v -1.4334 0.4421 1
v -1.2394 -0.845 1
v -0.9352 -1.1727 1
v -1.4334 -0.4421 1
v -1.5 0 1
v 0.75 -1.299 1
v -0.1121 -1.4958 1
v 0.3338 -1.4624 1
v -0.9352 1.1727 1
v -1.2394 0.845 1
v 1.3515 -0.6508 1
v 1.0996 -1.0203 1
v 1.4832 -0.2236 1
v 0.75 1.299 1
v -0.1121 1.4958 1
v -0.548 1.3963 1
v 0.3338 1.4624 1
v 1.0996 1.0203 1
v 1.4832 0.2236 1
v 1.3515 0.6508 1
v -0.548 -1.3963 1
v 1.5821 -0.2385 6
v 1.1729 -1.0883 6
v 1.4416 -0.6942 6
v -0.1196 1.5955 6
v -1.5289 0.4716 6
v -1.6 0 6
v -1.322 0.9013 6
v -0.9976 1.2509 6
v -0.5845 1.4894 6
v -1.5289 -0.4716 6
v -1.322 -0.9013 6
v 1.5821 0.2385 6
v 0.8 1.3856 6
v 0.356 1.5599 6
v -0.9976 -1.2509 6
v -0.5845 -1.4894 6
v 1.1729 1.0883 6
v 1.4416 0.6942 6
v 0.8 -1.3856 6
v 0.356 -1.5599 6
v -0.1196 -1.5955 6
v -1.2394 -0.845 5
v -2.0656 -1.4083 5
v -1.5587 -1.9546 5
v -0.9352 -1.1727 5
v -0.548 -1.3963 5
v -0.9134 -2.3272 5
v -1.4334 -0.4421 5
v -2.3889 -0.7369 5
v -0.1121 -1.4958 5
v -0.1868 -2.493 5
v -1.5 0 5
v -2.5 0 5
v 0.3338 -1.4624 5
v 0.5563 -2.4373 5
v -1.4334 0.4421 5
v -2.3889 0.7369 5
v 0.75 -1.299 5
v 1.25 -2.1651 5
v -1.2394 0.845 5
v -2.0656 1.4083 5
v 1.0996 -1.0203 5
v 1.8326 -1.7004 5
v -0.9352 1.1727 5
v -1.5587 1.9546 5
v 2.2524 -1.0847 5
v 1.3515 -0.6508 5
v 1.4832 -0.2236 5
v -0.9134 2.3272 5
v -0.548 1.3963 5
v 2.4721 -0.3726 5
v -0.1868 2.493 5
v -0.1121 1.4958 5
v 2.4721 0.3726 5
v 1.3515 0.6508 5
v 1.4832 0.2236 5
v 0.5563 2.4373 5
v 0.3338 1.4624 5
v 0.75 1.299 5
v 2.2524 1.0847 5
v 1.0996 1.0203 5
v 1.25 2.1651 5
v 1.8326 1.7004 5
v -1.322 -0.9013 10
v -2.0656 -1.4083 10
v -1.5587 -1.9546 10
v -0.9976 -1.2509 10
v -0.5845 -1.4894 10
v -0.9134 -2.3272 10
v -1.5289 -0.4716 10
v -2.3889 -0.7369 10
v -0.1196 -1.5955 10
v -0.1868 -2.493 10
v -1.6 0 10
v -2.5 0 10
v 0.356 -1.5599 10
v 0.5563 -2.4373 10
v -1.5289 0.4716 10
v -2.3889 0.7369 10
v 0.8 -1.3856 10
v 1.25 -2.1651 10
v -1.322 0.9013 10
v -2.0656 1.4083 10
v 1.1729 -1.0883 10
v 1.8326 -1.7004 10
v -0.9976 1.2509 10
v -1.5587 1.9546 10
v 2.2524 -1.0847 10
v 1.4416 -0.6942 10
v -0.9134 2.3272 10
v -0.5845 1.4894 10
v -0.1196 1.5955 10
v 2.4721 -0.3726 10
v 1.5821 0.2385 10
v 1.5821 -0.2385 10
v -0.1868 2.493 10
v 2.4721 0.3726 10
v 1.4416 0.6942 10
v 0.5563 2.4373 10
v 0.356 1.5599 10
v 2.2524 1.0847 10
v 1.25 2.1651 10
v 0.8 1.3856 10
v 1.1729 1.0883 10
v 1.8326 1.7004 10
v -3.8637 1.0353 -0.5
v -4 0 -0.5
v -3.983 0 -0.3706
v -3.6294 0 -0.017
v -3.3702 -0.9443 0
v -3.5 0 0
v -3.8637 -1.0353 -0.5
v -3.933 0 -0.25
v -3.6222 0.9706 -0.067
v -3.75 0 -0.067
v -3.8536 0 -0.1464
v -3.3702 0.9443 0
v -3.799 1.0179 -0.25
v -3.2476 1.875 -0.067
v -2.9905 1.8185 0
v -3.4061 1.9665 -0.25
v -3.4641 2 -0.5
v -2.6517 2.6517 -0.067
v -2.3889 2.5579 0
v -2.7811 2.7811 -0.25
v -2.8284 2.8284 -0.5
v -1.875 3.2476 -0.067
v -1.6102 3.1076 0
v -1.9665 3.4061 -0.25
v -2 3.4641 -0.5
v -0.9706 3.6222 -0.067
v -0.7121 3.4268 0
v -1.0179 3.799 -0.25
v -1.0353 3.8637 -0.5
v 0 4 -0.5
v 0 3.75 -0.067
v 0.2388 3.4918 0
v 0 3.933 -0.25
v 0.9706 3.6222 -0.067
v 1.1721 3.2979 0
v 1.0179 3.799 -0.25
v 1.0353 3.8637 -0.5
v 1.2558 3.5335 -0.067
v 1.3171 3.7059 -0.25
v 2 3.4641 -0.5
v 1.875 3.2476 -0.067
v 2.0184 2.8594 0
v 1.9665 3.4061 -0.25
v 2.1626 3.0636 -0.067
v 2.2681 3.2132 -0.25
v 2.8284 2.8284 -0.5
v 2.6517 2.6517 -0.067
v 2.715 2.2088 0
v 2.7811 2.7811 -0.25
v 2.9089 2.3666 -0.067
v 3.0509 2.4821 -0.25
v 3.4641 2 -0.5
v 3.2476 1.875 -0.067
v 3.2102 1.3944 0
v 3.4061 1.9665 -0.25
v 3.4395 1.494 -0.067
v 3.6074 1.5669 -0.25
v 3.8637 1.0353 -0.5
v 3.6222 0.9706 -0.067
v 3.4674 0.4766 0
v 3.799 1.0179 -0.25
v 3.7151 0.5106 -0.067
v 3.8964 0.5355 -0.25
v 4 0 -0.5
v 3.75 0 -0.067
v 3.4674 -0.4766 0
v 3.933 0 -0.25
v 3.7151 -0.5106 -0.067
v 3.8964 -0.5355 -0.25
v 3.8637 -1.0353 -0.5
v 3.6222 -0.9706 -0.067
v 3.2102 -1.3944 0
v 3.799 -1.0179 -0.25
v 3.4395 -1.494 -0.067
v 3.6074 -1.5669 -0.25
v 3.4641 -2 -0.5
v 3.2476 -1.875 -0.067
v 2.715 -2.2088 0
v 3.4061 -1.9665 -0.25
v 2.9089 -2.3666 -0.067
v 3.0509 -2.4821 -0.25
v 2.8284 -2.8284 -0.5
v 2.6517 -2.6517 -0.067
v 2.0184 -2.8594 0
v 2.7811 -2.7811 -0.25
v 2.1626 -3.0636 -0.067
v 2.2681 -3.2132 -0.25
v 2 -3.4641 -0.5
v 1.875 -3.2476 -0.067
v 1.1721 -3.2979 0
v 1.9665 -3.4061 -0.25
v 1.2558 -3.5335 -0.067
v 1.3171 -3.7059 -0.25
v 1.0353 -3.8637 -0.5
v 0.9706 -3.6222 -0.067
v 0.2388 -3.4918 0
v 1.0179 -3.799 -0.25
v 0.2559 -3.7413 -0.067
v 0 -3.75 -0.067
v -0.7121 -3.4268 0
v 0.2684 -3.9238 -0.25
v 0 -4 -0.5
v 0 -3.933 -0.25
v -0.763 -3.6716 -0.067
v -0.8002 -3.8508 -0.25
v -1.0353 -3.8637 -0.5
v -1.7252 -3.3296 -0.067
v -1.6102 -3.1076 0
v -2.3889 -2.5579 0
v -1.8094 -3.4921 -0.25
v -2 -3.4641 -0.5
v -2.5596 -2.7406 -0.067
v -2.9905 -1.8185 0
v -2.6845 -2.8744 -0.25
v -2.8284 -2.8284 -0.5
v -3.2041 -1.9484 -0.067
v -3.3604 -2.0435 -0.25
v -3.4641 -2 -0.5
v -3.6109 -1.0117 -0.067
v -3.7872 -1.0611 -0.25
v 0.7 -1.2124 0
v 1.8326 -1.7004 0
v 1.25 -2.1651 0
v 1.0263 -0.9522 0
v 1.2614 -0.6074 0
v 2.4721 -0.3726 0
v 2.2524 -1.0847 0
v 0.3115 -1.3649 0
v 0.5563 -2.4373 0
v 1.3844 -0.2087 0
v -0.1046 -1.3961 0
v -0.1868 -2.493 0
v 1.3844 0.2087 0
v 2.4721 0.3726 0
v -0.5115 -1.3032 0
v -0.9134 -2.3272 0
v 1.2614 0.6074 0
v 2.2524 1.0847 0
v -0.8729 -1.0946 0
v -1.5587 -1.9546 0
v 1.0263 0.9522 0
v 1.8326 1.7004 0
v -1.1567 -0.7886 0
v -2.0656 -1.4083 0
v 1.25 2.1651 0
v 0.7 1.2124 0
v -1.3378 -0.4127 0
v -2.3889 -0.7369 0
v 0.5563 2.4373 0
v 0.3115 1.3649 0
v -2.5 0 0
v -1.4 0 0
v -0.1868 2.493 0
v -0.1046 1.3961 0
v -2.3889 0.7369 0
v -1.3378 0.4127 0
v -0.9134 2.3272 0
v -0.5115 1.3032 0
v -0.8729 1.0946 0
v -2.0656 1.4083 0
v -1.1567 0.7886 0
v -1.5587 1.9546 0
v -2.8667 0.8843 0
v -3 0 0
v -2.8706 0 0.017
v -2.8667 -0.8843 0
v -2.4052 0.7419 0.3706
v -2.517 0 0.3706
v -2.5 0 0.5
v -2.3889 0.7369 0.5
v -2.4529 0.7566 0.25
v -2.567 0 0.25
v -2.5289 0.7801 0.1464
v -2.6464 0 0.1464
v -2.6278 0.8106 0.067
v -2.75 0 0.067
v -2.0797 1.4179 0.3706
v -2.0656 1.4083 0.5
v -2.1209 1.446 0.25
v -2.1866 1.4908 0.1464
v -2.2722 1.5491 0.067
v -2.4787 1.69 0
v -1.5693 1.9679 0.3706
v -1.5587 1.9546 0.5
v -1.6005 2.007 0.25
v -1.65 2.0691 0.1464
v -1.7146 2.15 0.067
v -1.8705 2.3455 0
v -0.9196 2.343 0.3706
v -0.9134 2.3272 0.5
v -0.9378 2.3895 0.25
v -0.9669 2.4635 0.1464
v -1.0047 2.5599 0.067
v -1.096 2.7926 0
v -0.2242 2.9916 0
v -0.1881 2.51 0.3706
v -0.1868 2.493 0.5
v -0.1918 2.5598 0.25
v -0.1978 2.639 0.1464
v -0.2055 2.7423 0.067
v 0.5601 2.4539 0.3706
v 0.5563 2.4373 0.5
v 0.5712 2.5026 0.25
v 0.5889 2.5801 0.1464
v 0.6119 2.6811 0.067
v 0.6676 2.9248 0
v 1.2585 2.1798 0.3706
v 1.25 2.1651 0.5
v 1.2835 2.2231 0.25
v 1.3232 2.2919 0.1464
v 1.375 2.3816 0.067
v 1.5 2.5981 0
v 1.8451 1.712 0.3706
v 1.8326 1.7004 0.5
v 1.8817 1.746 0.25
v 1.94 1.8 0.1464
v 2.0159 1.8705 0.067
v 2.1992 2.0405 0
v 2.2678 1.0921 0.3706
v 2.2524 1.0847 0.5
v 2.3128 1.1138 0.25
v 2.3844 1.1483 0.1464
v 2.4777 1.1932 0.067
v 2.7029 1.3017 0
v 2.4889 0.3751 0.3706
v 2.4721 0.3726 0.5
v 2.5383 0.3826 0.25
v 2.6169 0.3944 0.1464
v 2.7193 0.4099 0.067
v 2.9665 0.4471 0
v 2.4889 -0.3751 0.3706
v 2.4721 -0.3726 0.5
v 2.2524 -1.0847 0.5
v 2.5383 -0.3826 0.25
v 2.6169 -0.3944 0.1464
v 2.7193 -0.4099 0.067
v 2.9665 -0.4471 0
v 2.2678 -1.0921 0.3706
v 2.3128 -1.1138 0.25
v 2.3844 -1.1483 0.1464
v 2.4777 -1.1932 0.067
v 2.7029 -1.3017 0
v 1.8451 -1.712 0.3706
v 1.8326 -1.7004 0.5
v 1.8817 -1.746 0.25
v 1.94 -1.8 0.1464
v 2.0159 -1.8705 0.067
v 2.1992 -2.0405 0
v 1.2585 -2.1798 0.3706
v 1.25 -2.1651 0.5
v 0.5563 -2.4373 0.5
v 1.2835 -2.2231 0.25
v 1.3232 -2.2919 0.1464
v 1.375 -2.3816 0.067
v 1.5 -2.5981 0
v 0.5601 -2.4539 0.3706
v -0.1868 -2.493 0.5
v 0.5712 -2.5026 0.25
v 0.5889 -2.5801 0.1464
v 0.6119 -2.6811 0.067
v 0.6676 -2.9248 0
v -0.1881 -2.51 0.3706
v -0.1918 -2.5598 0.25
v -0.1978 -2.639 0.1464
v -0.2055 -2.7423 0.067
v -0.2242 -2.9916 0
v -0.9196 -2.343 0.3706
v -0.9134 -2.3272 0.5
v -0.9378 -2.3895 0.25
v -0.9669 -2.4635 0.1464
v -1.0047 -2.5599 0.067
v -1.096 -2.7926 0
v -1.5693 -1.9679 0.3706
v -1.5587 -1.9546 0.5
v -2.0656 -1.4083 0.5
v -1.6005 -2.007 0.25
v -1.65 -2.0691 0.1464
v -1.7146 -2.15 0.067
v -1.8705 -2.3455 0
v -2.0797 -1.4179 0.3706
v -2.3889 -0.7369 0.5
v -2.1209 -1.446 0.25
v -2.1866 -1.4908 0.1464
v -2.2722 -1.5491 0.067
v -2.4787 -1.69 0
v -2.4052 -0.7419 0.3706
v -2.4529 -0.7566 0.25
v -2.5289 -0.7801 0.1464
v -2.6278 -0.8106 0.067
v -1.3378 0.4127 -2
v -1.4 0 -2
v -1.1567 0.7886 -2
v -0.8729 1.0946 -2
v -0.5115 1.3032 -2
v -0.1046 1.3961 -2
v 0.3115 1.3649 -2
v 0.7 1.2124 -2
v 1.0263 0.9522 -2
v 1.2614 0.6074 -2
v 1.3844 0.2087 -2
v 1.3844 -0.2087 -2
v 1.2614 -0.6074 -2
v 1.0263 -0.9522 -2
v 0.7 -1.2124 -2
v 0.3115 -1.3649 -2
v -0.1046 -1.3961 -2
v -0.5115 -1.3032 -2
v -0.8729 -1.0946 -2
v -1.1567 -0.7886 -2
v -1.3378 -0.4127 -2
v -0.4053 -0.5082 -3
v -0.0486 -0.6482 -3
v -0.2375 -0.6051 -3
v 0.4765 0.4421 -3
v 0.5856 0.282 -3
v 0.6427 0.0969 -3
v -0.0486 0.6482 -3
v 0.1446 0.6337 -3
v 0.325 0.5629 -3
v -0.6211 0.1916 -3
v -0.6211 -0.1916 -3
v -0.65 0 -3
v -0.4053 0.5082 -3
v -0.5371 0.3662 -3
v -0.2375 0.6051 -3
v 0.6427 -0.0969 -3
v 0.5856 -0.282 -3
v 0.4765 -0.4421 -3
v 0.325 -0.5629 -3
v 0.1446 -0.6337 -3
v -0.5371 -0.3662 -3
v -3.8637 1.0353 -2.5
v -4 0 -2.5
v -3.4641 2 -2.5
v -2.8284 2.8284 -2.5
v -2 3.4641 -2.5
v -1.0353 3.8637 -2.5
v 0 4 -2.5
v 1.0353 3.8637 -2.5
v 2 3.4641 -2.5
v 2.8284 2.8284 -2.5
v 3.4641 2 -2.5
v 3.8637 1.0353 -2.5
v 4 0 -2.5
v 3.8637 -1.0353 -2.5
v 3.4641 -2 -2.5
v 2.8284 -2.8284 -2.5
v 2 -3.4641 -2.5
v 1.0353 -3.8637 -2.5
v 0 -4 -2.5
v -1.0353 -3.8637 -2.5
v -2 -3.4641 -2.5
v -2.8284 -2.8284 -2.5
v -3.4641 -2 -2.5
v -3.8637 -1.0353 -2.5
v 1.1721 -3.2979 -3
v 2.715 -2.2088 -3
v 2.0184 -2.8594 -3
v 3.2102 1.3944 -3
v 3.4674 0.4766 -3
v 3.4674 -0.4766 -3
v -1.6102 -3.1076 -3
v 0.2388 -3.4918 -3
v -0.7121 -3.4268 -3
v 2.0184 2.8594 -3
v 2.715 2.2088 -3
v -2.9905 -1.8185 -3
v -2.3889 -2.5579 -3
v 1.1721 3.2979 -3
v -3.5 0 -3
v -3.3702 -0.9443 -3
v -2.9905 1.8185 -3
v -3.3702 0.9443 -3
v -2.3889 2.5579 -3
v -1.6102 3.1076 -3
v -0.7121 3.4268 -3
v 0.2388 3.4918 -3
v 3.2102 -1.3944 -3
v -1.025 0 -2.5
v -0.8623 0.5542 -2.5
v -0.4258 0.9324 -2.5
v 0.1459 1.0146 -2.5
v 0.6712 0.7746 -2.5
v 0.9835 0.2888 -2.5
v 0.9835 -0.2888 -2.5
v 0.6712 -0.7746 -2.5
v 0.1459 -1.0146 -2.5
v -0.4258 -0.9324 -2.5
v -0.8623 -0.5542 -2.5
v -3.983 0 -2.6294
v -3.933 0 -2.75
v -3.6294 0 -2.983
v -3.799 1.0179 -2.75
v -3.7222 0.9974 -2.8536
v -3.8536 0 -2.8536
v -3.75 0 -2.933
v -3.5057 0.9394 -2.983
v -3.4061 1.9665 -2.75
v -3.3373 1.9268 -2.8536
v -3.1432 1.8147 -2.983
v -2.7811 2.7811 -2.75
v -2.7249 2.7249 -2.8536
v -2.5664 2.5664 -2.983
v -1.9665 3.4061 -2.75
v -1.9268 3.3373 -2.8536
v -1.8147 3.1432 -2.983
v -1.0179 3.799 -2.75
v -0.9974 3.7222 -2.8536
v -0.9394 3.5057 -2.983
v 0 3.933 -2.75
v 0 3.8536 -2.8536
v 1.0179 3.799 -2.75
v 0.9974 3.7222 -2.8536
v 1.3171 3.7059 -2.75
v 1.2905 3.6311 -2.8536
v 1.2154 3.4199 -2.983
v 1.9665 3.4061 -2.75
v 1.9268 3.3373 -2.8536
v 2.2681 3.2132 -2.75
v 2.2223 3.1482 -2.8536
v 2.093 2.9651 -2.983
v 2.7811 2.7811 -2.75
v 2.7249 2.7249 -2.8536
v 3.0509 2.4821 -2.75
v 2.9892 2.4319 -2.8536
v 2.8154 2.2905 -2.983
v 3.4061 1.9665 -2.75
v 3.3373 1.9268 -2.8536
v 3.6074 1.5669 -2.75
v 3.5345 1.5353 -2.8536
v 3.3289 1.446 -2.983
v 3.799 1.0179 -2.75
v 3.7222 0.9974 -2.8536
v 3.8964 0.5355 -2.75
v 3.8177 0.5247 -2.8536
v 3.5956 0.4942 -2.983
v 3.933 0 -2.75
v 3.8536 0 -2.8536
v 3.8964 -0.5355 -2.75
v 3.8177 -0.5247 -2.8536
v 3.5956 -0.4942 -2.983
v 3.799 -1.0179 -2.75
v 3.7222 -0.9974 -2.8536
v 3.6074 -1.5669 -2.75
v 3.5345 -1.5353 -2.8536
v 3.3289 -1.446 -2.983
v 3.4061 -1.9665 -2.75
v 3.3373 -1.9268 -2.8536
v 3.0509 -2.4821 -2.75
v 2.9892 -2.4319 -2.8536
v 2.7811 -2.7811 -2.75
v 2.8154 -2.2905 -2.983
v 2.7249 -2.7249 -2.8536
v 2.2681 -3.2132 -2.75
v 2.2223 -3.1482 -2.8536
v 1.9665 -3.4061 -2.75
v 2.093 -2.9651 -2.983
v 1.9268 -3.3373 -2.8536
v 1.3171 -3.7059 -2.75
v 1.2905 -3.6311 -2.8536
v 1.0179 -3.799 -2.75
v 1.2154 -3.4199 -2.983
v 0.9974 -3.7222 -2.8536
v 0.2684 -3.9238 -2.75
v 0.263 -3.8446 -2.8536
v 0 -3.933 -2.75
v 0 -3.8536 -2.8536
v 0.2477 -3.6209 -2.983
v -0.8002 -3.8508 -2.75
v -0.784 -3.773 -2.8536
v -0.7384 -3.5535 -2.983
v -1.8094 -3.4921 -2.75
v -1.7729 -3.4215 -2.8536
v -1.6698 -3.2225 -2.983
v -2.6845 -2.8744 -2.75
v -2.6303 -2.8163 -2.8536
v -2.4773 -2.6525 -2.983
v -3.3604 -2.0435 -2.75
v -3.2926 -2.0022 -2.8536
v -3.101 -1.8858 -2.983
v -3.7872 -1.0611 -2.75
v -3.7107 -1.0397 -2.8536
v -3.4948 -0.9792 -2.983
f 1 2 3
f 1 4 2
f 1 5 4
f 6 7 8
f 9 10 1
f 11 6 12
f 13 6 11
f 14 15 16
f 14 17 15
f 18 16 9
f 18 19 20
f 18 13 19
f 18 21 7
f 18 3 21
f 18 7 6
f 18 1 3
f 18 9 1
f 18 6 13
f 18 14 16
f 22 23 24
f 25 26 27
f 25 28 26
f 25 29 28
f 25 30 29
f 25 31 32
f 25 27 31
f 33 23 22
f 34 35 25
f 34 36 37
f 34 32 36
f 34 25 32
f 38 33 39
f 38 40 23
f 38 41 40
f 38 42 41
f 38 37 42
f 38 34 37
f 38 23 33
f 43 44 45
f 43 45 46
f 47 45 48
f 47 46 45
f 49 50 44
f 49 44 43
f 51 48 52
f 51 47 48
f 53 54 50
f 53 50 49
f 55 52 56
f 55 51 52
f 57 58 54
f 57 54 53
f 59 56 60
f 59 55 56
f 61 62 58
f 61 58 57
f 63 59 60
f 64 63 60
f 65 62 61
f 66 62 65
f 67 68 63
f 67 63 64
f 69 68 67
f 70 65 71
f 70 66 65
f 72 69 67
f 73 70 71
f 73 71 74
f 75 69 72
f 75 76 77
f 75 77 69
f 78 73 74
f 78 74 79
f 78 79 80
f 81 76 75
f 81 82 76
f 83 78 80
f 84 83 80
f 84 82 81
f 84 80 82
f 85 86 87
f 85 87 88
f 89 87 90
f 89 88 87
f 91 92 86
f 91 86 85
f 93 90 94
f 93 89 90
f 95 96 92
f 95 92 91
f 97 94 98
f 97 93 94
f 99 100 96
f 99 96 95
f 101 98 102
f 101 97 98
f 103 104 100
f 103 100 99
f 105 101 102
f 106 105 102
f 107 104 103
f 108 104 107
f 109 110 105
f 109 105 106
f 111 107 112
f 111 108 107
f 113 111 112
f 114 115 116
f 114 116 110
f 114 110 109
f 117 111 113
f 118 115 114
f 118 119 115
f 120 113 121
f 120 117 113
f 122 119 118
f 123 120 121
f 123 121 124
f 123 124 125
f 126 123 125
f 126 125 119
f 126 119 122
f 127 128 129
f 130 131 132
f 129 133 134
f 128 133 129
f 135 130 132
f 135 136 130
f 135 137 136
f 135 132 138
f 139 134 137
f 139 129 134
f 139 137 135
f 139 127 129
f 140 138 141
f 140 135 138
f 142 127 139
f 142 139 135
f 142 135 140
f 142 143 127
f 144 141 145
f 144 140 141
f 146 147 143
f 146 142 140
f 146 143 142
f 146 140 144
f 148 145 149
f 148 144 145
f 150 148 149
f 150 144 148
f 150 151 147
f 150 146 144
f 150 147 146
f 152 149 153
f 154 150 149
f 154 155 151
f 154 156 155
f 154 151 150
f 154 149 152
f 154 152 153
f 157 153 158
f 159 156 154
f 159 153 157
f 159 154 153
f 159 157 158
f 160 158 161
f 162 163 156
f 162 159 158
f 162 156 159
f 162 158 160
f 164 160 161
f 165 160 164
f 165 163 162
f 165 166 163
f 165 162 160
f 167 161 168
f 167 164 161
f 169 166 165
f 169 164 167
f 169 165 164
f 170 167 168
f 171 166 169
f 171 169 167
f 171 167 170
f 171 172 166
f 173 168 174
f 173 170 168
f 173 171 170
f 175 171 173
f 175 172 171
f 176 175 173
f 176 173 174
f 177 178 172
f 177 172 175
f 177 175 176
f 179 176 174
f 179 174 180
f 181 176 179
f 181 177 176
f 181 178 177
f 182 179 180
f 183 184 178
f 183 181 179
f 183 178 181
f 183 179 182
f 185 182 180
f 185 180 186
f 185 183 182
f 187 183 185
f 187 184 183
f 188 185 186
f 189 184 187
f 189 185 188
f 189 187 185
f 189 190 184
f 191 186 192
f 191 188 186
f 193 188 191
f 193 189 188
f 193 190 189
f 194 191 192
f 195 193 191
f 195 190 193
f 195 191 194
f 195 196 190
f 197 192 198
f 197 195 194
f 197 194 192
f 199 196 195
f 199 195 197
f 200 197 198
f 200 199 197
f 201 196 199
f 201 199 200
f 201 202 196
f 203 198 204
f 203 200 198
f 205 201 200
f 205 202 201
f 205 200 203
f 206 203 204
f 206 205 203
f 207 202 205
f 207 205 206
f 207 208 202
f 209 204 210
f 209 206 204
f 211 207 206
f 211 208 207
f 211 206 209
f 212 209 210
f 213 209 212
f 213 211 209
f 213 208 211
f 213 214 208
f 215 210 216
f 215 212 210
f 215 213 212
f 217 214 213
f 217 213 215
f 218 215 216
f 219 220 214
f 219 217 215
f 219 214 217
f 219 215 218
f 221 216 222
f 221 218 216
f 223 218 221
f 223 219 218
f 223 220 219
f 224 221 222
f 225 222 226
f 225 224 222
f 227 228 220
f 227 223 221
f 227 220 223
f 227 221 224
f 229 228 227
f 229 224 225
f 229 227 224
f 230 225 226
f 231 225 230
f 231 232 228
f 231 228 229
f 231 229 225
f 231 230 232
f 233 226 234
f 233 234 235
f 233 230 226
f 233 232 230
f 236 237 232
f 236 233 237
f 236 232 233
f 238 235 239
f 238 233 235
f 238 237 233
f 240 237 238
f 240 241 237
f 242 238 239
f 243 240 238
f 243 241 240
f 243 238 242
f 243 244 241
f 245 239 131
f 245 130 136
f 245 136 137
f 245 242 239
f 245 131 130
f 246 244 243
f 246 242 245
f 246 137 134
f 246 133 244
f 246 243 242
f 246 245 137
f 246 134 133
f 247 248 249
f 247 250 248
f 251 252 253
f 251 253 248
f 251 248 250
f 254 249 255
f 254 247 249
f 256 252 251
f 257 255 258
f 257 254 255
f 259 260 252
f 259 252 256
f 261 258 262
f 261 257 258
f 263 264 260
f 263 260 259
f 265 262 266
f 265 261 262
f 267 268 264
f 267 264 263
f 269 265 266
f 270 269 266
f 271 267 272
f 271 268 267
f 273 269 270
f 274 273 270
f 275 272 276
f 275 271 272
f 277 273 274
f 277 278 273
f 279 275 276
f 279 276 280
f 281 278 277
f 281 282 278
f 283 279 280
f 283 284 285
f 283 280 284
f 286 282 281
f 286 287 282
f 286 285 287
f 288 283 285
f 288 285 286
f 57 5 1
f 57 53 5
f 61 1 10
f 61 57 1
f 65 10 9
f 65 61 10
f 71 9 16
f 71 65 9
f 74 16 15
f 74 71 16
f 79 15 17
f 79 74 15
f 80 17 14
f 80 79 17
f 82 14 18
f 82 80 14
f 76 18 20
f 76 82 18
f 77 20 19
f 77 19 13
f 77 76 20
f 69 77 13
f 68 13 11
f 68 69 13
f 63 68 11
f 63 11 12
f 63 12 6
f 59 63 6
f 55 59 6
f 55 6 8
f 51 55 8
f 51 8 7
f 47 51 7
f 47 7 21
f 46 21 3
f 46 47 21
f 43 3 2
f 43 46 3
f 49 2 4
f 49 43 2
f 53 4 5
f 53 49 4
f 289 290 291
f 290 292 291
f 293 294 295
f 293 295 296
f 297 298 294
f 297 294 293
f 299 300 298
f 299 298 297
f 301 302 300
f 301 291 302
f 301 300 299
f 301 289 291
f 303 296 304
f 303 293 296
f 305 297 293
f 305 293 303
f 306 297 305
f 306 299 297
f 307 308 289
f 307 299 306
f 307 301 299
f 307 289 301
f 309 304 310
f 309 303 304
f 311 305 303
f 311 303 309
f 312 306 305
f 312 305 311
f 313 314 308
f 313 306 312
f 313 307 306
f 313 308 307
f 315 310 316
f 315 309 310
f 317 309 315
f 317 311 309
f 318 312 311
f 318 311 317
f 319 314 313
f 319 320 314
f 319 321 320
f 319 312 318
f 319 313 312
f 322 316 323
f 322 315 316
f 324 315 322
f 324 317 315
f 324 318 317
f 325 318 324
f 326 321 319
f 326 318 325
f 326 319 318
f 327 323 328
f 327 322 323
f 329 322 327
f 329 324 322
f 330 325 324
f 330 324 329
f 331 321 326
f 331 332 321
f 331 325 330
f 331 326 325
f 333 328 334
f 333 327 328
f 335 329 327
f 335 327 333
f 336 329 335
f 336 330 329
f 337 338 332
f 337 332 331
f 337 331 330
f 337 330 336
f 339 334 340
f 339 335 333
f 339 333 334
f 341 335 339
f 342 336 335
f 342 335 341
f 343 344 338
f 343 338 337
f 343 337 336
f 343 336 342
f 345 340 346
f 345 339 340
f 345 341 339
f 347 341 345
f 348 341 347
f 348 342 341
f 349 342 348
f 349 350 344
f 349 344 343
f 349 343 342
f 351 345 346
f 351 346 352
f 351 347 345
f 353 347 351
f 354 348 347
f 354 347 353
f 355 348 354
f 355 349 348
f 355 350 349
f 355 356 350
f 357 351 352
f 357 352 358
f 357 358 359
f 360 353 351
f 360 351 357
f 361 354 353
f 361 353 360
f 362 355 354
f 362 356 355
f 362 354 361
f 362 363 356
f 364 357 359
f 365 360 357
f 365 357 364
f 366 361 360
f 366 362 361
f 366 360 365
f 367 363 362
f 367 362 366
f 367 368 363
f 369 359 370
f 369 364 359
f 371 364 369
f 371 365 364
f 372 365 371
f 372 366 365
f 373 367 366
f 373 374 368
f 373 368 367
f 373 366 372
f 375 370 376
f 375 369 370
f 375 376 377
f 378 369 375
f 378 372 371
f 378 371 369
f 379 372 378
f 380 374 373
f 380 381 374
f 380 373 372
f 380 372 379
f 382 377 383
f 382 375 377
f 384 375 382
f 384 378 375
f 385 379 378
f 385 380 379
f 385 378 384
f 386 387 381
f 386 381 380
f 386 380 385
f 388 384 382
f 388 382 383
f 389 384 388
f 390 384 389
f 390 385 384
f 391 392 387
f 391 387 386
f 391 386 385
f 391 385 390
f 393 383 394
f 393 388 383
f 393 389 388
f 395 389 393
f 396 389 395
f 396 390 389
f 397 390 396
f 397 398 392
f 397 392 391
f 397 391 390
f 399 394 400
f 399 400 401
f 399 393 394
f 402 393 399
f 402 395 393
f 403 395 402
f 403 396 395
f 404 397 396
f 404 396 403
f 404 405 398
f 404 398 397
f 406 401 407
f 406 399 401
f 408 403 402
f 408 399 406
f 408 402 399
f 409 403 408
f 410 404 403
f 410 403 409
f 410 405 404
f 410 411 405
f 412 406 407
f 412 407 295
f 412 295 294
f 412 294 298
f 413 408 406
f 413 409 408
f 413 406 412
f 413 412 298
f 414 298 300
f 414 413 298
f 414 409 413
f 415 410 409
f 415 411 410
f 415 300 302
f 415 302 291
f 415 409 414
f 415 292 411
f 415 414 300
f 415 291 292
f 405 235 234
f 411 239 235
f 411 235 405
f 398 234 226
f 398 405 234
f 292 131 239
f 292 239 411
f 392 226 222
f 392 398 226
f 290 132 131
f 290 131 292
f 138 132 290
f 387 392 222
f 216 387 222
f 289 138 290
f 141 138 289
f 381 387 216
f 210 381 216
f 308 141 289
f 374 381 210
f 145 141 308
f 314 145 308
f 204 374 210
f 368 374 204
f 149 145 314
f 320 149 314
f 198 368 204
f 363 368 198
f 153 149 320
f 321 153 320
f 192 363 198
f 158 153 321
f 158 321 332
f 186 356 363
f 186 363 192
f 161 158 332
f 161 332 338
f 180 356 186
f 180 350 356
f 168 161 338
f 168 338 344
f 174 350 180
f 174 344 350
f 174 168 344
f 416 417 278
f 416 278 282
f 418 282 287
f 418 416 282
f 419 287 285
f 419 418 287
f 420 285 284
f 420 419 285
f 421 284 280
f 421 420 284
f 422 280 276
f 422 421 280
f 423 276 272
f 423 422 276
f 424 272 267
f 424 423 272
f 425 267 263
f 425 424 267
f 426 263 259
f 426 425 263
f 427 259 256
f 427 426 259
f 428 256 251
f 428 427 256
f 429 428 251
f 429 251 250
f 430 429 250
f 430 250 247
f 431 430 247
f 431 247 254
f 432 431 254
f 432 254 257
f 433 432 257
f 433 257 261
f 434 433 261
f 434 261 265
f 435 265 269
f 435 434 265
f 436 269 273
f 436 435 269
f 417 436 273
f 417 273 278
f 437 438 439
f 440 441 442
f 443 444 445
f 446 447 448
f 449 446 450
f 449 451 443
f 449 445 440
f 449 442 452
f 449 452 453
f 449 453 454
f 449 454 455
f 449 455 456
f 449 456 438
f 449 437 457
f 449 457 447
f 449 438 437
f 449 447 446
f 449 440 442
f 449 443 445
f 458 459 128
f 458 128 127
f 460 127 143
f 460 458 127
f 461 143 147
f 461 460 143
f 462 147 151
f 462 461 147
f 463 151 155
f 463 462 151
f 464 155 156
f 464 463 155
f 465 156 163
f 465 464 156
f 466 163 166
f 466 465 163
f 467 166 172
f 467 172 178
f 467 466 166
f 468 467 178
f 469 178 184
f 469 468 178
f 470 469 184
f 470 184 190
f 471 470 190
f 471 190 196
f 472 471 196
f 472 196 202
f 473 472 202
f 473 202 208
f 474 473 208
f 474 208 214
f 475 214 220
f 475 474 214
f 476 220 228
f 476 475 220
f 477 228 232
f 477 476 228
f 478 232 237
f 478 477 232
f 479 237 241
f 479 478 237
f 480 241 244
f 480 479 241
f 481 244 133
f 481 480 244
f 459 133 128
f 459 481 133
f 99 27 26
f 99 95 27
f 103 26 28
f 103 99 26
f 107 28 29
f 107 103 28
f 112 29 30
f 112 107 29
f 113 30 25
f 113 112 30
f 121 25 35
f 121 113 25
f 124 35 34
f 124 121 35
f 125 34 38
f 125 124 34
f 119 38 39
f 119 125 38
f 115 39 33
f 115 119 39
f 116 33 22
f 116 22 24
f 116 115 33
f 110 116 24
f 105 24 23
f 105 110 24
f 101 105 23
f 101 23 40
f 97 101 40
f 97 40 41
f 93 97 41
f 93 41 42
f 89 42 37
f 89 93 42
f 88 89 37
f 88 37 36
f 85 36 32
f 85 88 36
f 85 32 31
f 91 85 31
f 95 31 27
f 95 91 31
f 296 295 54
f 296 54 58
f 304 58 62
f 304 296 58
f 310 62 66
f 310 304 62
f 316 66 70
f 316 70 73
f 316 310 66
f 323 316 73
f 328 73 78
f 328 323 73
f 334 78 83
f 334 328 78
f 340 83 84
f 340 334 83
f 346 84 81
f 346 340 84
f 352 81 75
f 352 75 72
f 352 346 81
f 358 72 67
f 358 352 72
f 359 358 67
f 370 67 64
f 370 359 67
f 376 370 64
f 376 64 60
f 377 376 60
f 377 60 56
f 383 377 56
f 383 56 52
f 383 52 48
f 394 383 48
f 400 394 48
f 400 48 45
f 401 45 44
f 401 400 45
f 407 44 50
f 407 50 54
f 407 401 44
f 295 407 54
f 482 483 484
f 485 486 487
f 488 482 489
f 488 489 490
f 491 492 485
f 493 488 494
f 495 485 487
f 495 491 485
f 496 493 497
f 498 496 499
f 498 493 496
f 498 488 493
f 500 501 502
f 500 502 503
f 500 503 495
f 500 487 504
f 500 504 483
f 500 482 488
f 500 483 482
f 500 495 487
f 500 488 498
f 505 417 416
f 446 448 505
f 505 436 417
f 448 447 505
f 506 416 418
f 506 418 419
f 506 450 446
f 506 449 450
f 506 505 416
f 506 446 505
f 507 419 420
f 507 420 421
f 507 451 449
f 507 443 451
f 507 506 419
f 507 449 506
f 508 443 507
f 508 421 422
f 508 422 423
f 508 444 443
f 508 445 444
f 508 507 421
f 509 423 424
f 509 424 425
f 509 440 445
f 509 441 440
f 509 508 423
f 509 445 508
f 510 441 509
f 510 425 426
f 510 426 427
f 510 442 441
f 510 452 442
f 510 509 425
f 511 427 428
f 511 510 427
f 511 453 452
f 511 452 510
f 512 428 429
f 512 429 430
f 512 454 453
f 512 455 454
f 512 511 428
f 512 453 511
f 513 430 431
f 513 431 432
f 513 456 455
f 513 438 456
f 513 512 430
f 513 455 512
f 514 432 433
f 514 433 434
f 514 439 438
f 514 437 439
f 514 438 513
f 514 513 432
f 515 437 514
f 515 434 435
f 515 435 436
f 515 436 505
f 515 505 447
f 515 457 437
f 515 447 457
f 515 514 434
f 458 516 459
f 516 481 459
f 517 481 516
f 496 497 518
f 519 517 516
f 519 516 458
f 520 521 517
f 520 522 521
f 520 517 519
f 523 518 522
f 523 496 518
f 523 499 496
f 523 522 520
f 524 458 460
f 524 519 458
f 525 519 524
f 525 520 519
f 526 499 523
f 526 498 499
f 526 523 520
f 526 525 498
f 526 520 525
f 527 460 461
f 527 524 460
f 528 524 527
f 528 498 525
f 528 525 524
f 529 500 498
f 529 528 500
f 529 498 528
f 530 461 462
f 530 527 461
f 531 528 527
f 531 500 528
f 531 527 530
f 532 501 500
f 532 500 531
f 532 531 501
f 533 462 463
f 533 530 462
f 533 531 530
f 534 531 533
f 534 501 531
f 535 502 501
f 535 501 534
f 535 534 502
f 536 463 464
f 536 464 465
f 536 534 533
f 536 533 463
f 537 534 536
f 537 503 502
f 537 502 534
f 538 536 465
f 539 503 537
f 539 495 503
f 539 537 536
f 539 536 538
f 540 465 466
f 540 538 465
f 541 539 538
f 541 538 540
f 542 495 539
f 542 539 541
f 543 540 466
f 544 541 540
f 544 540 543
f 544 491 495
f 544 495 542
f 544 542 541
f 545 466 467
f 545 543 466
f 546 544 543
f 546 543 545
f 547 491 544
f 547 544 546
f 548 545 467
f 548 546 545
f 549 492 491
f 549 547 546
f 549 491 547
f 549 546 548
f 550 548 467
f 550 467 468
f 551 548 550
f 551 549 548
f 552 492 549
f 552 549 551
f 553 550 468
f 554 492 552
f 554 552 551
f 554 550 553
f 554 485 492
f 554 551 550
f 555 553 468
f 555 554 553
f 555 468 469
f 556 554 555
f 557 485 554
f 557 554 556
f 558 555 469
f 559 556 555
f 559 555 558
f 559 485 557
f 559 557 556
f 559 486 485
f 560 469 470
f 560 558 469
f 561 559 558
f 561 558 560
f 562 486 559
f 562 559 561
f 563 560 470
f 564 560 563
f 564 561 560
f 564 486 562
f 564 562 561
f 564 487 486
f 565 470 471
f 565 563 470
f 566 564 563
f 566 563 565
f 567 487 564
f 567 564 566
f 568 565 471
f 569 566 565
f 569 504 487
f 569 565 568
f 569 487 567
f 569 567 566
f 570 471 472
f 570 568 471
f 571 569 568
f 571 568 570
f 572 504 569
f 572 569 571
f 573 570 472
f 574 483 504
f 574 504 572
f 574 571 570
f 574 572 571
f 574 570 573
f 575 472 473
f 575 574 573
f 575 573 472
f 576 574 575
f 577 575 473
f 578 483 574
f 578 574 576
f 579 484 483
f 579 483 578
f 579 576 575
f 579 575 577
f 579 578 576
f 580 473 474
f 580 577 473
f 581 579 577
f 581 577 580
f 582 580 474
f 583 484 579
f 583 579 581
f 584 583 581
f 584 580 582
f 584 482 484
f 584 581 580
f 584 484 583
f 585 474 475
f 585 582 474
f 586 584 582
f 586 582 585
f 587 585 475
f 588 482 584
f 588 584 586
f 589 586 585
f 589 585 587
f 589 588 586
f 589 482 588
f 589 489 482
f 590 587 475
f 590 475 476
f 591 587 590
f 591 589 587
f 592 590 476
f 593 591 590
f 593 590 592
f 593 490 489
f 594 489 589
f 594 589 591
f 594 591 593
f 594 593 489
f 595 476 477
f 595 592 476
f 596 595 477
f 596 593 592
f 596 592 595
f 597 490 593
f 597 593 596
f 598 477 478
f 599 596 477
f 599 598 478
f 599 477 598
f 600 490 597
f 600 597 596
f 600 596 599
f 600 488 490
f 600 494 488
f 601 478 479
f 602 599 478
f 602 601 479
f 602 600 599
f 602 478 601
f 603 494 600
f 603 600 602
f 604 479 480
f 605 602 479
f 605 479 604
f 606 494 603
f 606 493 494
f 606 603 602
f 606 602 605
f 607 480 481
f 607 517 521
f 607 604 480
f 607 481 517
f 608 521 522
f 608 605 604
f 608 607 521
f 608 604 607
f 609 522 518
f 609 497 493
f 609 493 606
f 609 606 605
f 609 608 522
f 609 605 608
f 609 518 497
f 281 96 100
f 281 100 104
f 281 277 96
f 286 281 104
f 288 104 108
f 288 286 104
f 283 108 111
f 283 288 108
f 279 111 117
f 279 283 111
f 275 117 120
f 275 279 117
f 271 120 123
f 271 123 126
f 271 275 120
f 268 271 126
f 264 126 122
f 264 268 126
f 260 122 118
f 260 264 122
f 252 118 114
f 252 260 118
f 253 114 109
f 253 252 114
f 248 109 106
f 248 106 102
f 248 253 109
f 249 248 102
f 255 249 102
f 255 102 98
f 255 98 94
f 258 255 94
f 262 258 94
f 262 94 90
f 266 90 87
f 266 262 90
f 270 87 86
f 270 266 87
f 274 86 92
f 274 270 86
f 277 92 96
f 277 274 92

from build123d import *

# Parameters (mm, degrees)
F2_SIZE2 = 0.75
F2_SIZE  = 1
F5_R     = 0.5


with BuildPart() as f1:
    # F0 (on Front) → F1 (revolve)
    with BuildSketch(Plane.XZ):
        Polygon((-1.6, 6), (-1.6, 10), (-2.5, 10), (-2.5, 0), (-1.4, 0), (-1.4, -3), (0, -3), (0, 6), align=None)
    revolve(axis=Axis((0, 0, -0.0238702632), (0, 0, -1)))

    # F2
    f2_edges = [f1.edges().sort_by_distance(p)[0] for p in [
        (1.4, 0, -3),
    ]]
    chamfer(f2_edges, length=F2_SIZE, length2=F2_SIZE2)


with BuildPart() as f4:
    # F3 (on Front) → F4 (revolve)
    with BuildSketch(Plane.XZ):
        Polygon((-1.5, 1), (-1.5, 5), (-2.5, 5), (-2.5, 0), (-4, 0), (-4, -3), (0, -3), (0, 1), align=None)
    revolve(axis=Axis((0, 0, 1.4723995883), (0, 0, -1)))

    # F5
    f5_edges = [f4.edges().sort_by_distance(p)[0] for p in [
        (4, 0, -3),
        (4, 0, 0),
        (2.5, 0, 0),
    ]]
    fillet(f5_edges, radius=F5_R)


solid = Compound([f1.part, f4.part])
